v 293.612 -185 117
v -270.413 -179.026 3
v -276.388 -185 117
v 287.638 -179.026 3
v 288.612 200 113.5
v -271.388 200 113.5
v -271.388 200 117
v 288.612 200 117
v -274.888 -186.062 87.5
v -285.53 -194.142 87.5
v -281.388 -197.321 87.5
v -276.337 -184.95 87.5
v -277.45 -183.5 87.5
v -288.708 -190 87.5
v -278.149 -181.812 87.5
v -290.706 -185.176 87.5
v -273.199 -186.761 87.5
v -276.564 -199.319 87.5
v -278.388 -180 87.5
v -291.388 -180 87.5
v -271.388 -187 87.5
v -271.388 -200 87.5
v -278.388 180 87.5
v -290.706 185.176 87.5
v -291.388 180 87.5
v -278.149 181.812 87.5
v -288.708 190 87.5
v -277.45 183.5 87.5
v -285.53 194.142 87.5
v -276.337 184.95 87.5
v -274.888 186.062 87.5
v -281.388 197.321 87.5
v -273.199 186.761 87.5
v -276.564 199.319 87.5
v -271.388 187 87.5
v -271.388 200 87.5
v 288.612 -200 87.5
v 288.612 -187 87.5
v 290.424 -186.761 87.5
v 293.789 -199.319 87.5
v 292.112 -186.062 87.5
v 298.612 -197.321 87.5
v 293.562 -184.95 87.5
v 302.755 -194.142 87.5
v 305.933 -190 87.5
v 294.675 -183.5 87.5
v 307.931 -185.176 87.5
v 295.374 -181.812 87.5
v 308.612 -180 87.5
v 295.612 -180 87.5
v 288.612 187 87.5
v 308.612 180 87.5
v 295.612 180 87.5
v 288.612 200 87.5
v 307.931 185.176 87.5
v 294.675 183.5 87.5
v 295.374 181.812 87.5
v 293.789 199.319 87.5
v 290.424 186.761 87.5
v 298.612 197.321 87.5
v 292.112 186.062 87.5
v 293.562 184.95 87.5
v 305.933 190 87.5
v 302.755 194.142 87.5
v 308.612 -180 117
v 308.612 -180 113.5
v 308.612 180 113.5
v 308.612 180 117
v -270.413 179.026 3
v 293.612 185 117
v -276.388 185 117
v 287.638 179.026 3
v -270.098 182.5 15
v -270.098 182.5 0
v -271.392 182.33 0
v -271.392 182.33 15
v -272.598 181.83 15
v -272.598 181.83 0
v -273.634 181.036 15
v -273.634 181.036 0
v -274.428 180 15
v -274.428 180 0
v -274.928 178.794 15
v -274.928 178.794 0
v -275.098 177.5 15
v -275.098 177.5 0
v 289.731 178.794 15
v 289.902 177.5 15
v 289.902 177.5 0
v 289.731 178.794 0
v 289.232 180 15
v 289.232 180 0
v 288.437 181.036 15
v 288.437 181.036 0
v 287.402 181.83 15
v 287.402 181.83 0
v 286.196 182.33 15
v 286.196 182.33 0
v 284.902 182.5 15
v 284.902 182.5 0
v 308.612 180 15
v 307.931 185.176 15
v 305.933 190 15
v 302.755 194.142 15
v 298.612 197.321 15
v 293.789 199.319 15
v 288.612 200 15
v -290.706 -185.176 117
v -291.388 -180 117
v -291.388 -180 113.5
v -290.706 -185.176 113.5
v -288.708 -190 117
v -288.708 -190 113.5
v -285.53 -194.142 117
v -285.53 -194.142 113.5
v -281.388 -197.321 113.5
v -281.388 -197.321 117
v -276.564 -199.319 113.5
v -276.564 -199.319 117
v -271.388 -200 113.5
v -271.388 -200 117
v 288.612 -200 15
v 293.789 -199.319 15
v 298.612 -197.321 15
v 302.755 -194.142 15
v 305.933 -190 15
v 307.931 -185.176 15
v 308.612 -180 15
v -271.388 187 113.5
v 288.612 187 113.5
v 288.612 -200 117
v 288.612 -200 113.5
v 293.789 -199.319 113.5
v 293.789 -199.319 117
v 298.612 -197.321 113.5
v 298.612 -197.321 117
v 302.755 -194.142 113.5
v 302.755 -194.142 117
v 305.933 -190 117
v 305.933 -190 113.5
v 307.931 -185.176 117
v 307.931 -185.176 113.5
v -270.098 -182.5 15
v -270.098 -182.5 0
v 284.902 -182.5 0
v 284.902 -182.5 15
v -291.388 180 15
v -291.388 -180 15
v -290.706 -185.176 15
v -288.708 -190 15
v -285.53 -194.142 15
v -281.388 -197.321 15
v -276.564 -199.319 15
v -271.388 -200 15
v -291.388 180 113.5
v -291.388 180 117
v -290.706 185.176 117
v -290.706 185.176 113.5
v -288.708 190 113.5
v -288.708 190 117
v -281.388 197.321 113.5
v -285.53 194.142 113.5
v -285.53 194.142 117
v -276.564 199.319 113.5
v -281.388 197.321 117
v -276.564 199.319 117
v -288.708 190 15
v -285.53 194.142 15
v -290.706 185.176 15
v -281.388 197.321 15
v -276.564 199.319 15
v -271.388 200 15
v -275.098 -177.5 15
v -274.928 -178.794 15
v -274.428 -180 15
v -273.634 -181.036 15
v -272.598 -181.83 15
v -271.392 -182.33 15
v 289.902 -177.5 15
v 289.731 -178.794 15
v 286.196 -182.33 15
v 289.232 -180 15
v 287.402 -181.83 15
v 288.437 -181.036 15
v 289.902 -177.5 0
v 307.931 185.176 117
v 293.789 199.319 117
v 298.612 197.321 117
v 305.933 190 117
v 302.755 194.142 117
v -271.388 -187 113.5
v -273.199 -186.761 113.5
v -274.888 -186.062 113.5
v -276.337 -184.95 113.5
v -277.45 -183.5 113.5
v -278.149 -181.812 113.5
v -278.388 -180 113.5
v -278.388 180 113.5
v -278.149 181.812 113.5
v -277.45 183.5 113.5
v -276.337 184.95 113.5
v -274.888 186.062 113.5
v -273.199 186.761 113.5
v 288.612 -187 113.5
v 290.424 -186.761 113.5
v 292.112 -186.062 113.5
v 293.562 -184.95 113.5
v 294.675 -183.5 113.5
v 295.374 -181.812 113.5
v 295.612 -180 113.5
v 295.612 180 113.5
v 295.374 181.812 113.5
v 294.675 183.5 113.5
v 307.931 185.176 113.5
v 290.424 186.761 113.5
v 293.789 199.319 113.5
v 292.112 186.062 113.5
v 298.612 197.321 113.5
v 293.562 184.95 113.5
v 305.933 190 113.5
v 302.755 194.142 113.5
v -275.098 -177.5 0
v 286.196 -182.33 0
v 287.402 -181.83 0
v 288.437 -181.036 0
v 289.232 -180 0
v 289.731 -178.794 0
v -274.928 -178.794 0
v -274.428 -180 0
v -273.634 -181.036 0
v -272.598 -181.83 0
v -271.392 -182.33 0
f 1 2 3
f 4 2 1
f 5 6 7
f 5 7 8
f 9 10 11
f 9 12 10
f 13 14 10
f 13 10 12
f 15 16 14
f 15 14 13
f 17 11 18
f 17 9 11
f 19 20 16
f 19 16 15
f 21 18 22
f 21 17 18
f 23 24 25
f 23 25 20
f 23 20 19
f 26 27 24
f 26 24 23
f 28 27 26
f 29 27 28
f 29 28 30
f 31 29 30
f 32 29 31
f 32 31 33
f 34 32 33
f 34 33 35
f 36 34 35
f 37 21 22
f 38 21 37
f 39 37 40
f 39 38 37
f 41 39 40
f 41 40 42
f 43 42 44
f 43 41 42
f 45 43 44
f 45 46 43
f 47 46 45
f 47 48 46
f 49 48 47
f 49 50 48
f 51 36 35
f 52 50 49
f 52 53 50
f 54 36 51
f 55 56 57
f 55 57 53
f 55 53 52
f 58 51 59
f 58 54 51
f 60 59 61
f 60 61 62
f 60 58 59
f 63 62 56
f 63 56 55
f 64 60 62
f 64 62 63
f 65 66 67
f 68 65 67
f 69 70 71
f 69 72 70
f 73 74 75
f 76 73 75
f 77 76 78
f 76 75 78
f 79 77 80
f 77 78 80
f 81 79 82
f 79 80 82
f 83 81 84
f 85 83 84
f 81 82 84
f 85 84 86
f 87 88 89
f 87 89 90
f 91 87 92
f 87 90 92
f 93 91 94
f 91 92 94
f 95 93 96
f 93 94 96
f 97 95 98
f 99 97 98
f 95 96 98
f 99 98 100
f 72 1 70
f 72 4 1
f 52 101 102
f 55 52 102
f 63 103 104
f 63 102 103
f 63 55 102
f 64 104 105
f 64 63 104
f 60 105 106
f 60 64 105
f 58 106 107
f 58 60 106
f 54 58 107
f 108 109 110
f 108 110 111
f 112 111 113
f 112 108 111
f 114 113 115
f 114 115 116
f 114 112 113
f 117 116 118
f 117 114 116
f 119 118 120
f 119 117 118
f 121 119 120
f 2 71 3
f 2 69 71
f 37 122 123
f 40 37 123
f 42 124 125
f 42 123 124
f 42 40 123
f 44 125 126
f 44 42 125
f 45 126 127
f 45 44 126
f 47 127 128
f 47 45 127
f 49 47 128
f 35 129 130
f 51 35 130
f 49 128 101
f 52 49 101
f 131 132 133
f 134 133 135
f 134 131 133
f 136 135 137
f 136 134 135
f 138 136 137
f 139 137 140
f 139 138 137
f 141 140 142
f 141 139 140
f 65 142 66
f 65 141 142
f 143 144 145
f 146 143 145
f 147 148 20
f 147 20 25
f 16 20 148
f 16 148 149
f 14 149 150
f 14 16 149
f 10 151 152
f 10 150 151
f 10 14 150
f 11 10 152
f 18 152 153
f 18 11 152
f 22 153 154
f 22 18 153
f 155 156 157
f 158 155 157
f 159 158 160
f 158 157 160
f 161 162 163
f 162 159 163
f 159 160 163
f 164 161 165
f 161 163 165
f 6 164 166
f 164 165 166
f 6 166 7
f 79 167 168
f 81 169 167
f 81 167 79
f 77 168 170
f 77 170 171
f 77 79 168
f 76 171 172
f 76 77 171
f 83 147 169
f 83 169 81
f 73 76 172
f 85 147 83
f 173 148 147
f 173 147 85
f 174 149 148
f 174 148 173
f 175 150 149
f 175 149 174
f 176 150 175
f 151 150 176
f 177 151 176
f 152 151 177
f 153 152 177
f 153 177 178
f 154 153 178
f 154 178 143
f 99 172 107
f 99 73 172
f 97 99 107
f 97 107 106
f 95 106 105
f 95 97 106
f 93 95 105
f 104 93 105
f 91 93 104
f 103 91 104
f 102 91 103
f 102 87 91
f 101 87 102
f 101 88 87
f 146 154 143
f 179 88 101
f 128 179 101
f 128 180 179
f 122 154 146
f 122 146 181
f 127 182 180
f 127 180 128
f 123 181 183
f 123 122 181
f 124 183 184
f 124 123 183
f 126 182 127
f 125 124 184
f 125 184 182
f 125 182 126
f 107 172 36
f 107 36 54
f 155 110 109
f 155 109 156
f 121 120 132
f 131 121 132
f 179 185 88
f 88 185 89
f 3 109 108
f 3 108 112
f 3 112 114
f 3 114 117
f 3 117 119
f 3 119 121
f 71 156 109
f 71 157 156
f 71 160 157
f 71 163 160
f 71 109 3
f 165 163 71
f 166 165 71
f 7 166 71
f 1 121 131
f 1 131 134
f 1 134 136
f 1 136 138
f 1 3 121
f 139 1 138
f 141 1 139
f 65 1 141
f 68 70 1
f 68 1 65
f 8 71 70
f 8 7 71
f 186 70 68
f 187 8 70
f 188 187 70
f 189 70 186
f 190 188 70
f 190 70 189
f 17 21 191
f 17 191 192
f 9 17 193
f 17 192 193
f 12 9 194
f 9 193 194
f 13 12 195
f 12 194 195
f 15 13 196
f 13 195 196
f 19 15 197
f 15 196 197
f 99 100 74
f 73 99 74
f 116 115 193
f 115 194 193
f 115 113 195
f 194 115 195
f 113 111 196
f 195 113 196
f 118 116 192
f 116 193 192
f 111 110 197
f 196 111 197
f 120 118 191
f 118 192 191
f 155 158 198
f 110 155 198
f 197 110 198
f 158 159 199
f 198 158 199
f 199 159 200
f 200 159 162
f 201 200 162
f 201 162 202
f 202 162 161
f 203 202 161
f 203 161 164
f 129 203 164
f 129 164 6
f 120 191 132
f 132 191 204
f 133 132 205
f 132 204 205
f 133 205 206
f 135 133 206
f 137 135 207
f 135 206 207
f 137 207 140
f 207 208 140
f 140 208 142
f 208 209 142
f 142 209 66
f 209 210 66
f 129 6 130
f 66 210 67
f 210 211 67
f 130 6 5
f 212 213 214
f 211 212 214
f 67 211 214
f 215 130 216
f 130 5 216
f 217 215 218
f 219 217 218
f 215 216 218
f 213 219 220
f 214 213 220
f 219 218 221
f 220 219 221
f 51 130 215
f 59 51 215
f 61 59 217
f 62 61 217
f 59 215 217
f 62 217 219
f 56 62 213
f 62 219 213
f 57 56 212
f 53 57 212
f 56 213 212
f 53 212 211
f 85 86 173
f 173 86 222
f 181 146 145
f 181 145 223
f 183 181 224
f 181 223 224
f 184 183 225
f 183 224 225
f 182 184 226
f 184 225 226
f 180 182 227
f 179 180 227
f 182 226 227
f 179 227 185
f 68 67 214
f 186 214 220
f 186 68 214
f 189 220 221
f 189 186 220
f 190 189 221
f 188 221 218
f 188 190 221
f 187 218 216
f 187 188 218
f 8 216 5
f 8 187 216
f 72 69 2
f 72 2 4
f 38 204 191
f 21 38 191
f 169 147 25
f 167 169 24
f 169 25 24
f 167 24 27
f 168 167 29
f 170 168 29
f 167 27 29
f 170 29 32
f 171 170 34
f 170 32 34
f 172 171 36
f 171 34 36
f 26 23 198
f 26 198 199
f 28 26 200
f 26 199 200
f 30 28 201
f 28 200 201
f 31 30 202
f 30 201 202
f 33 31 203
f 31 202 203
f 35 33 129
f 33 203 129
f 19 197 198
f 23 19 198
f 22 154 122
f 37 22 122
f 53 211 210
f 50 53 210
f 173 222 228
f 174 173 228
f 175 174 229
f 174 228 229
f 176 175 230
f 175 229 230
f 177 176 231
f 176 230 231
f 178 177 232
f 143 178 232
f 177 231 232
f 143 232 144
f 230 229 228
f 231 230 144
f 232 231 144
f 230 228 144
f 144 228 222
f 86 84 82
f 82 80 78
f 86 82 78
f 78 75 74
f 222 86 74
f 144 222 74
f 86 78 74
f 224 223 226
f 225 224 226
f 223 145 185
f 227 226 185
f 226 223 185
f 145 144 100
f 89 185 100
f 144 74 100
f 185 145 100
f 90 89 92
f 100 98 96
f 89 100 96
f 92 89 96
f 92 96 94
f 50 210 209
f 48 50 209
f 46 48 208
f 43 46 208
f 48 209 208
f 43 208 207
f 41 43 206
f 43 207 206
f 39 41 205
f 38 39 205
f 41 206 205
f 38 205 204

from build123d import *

# Parameters (mm, degrees)
F0_W     = 600
F0_H     = 400
F1_DEPTH = 117
F2_R     = 20
F4_DEPTH = 15
F7_DEPTH = 26
F8_W     = 570
F8_H     = 370
F9_DEPTH = 114
F9_TAPER = 3


with BuildPart() as f1:
    # F0 (on Top) → F1 (new body)
    with BuildSketch(Plane.XY):
        with Locations((8.6124254986, 0)):
            Rectangle(F0_W, F0_H)
    extrude(amount=F1_DEPTH)

    # F2
    f2_edges = [f1.edges().sort_by_distance(p)[0] for p in [
        (-291.387575, -200, 58.5),
        (308.612425, -200, 58.5),
        (308.612425, 200, 58.5),
        (-291.387575, 200, 58.5),
    ]]
    fillet(f2_edges, radius=F2_R)

    # F3 (on face) → F4 (cut)
    with BuildSketch(Plane(origin=(0, 0, 0), x_dir=(1, 0, 0), z_dir=(0, 0, -1))):
        with BuildLine():
            ThreePointArc((308.6124254986, 180), (302.7545611224, 194.1421356237), (288.6124254986, 200))
            Line((288.6124254986, 200), (-271.3875745014, 200))
            ThreePointArc((-271.3875745014, 200), (-285.5297101251, 194.1421356237), (-291.3875745014, 180))
            Line((-291.3875745014, 180), (-291.3875745014, -180))
            ThreePointArc((-291.3875745014, -180), (-285.5297101251, -194.1421356237), (-271.3875745014, -200))
            Line((-271.3875745014, -200), (288.6124254986, -200))
            ThreePointArc((288.6124254986, -200), (302.7545611224, -194.1421356237), (308.6124254986, -180))
            Line((308.6124254986, -180), (308.6124254986, 180))
        make_face()
        with BuildLine():
            ThreePointArc((-275.0983515568, 177.5), (-273.6338854627, 181.0355339059), (-270.0983515568, 182.5))
            Line((-270.0983515568, 182.5), (284.9016484432, 182.5))
            ThreePointArc((284.9016484432, 182.5), (288.4371823491, 181.0355339059), (289.9016484432, 177.5))
            Line((289.9016484432, 177.5), (289.9016484432, -177.5))
            ThreePointArc((289.9016484432, -177.5), (288.4371823491, -181.0355339059), (284.9016484432, -182.5))
            Line((284.9016484432, -182.5), (-270.0983515568, -182.5))
            ThreePointArc((-270.0983515568, -182.5), (-273.6338854627, -181.0355339059), (-275.0983515568, -177.5))
            Line((-275.0983515568, -177.5), (-275.0983515568, 177.5))
        make_face(mode=Mode.SUBTRACT)
    extrude(amount=-F4_DEPTH, mode=Mode.SUBTRACT)

    # F6 (on offset) → F7 (cut)
    with BuildSketch(Plane.XY.offset(113.5)):
        with BuildLine():
            ThreePointArc((-271.3875745014, 200), (-285.5297101251, 194.1421356237), (-291.3875745014, 180))
            Line((-291.3875745014, 180), (-291.3875745014, -180))
            ThreePointArc((-291.3875745014, -180), (-285.5297101251, -194.1421356237), (-271.3875745014, -200))
            Line((-271.3875745014, -200), (288.6124254986, -200))
            ThreePointArc((288.6124254986, -200), (302.7545611224, -194.1421356237), (308.6124254986, -180))
            Line((308.6124254986, -180), (308.6124254986, 180))
            ThreePointArc((308.6124254986, 180), (302.7545611224, 194.1421356237), (288.6124254986, 200))
            Line((288.6124254986, 200), (-271.3875745014, 200))
        make_face()
        with BuildLine():
            ThreePointArc((-278.3875745014, 180), (-276.3373219697, 184.9497474683), (-271.3875745014, 187))
            Line((-271.3875745014, 187), (288.6124254986, 187))
            ThreePointArc((288.6124254986, 187), (293.5621729669, 184.9497474683), (295.6124254986, 180))
            Line((295.6124254986, 180), (295.6124254986, -180))
            ThreePointArc((295.6124254986, -180), (293.5621729669, -184.9497474683), (288.6124254986, -187))
            Line((288.6124254986, -187), (-271.3875745014, -187))
            ThreePointArc((-271.3875745014, -187), (-276.3373219697, -184.9497474683), (-278.3875745014, -180))
            Line((-278.3875745014, -180), (-278.3875745014, 180))
        make_face(mode=Mode.SUBTRACT)
    extrude(amount=-F7_DEPTH, mode=Mode.SUBTRACT)

    # F8 (on face) → F9 (cut)
    with BuildSketch(Plane.XY.offset(117)):
        with Locations((8.6124254986, 0)):
            Rectangle(F8_W, F8_H)
    extrude(amount=-F9_DEPTH, taper=F9_TAPER, mode=Mode.SUBTRACT)


solid = f1.part
